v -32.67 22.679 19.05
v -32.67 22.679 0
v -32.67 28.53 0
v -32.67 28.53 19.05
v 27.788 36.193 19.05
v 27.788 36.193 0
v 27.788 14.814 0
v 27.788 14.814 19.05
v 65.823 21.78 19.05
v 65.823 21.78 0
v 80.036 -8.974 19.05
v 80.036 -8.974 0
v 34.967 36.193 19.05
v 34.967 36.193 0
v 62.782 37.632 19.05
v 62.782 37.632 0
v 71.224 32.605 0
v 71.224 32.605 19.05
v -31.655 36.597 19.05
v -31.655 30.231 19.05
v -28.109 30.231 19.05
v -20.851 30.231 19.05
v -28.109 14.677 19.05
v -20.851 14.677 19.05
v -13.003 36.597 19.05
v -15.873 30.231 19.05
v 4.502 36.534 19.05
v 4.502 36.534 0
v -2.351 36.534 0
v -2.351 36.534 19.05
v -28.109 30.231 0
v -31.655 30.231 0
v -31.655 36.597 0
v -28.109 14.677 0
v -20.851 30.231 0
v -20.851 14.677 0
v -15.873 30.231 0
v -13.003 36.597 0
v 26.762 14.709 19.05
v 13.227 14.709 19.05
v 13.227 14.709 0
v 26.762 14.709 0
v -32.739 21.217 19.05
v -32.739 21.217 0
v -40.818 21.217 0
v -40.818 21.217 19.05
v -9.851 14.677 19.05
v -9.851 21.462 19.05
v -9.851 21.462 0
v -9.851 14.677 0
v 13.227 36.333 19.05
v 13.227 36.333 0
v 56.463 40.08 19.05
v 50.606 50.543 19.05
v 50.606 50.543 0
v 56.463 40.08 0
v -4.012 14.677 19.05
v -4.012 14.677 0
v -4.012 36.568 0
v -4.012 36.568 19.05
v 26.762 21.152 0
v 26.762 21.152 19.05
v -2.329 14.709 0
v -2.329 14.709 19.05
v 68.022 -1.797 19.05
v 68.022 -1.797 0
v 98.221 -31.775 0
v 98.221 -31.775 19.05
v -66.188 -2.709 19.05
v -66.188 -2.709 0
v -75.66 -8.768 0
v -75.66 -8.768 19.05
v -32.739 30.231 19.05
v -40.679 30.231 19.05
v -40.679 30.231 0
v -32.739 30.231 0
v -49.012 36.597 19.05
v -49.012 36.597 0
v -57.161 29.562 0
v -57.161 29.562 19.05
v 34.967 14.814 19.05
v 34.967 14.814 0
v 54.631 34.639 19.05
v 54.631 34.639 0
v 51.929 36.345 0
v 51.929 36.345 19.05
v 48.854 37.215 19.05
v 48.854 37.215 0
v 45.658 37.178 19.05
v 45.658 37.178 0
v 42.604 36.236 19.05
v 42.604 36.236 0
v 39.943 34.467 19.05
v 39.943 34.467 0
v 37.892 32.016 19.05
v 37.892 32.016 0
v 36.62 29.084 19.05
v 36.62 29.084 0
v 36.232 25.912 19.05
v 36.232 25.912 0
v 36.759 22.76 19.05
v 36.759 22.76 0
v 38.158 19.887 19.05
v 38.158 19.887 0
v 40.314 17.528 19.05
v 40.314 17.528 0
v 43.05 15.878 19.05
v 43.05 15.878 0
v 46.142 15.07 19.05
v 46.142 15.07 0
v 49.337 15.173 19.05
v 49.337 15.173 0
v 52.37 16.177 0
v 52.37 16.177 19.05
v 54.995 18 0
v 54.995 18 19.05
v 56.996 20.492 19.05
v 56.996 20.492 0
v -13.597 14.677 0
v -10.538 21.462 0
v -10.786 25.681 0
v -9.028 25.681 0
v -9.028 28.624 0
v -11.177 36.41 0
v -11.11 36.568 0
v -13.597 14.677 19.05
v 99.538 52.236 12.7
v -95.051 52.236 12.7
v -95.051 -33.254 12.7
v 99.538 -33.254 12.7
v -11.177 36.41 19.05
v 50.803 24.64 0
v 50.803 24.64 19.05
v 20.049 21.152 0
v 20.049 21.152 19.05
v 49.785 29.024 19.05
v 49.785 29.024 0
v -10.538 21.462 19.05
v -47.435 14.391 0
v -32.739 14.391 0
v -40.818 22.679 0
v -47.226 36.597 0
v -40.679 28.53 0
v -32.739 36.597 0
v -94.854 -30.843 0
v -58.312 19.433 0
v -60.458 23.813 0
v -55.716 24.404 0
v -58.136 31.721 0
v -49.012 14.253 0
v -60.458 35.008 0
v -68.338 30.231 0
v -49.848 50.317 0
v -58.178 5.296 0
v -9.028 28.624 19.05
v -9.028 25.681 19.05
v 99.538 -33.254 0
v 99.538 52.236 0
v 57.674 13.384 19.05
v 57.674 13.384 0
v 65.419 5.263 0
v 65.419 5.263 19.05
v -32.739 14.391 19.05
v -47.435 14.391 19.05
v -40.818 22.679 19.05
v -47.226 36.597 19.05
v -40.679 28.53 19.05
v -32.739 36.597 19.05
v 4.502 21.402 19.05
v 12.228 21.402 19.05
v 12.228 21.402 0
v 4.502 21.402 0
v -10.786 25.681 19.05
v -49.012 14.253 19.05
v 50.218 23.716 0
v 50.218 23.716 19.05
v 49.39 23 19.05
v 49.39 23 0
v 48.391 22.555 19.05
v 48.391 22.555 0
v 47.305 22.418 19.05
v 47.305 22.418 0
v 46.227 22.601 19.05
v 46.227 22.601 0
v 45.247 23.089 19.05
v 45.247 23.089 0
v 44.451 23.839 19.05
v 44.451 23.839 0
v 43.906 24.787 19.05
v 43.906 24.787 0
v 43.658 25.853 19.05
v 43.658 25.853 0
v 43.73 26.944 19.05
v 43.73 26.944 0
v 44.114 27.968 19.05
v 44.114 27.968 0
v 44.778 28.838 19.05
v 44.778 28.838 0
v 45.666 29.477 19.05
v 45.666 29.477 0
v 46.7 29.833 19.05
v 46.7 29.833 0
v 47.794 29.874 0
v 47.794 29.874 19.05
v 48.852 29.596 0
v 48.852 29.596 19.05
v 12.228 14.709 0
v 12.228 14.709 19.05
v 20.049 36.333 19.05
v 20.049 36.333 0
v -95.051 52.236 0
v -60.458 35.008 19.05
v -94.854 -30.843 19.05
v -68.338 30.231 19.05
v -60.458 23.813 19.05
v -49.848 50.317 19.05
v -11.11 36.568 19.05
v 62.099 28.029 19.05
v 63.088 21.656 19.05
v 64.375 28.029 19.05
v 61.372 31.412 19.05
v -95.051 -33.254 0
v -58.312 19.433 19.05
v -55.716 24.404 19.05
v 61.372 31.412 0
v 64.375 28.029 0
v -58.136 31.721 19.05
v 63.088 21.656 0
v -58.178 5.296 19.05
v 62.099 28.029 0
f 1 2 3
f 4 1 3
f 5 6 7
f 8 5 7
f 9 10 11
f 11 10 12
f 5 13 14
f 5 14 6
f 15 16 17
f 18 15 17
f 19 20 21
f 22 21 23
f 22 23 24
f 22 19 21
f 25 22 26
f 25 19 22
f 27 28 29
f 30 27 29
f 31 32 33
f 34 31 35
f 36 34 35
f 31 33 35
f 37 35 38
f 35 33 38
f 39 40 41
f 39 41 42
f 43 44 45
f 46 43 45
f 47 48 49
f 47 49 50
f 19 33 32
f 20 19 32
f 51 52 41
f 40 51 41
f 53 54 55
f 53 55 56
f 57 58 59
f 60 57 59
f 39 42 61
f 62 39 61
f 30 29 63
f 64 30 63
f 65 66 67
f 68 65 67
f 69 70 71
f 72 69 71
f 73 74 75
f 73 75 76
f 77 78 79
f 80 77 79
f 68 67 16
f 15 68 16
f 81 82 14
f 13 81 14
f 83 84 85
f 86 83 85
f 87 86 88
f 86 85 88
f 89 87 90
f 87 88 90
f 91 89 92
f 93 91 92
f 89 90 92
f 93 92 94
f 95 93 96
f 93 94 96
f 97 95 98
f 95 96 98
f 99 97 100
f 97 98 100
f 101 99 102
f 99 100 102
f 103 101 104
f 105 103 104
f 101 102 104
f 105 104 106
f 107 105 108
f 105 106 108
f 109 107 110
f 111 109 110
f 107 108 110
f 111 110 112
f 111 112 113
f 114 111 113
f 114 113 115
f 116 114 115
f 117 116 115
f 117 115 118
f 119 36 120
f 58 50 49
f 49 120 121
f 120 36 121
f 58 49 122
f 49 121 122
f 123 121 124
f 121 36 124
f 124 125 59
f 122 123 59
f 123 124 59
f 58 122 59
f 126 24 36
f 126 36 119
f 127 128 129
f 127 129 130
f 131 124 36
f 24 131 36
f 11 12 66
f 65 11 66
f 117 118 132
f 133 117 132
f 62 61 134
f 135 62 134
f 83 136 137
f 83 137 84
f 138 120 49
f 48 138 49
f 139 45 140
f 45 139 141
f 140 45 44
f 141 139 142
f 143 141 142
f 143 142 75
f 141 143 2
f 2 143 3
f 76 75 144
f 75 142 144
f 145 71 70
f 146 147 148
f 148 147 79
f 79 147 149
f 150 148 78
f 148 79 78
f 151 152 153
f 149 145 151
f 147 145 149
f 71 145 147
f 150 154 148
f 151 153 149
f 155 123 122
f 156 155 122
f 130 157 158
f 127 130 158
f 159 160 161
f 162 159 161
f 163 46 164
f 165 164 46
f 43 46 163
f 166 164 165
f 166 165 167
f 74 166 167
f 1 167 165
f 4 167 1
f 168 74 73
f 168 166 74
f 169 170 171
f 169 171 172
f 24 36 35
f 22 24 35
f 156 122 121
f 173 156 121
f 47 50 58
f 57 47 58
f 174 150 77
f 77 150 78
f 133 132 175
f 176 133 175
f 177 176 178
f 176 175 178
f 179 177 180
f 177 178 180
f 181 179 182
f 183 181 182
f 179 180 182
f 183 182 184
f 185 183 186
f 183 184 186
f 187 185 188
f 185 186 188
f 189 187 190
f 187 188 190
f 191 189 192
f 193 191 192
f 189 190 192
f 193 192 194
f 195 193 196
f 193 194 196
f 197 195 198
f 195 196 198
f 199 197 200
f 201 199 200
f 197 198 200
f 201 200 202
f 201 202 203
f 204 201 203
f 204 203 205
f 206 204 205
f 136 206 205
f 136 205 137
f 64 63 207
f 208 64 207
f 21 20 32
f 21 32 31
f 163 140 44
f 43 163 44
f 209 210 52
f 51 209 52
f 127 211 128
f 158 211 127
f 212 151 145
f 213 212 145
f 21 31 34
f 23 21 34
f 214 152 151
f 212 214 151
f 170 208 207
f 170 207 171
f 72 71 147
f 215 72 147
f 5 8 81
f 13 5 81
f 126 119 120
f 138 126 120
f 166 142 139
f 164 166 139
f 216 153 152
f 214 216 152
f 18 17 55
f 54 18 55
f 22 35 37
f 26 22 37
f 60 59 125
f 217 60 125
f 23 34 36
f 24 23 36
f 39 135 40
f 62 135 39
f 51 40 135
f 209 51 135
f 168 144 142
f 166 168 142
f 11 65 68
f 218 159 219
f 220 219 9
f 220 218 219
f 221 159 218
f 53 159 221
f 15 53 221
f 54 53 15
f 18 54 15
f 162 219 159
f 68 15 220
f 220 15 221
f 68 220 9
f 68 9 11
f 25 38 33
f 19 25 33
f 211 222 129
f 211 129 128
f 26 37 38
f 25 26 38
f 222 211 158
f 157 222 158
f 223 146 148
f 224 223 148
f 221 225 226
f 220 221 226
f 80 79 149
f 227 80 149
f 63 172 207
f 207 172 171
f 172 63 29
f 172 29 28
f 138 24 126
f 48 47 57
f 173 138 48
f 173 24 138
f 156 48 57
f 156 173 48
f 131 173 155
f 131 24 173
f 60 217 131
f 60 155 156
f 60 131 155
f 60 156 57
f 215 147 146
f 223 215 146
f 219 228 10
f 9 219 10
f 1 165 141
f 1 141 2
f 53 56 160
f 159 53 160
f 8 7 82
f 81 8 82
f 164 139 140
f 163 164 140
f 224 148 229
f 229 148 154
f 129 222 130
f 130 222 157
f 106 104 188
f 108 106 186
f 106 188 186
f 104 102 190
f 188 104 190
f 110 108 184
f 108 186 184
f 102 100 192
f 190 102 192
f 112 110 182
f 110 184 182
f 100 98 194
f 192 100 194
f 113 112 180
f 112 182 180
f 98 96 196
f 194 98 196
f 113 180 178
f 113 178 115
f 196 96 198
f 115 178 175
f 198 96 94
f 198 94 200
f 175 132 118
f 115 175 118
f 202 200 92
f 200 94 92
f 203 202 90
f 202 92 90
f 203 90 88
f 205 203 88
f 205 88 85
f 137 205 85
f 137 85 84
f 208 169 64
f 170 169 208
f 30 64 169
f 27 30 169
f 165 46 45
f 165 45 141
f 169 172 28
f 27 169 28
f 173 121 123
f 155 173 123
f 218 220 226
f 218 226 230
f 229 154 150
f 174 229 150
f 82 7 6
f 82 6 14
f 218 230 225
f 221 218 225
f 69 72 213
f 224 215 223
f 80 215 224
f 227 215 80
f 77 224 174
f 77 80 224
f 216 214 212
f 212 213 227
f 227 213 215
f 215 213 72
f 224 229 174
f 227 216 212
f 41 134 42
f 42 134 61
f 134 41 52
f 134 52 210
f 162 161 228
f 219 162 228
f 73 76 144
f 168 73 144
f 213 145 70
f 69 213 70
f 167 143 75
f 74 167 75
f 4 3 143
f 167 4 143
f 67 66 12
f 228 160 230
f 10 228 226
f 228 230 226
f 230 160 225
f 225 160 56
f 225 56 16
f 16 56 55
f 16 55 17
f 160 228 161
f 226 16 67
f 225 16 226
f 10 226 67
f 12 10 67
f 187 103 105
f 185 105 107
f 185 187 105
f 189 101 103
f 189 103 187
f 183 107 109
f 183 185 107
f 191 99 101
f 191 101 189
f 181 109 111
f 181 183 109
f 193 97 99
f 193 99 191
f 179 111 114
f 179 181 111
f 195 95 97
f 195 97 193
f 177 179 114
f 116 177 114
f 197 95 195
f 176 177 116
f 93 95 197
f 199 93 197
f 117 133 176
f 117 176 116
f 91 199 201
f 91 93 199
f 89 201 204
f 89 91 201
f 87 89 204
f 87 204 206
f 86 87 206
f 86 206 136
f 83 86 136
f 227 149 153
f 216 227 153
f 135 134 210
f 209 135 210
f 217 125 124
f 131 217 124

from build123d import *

# Parameters (mm, degrees)
F2_DEPTH = 19.05
F1_W     = 194.589332
F1_H     = 85.490536
F3_DEPTH = 12.7


with BuildPart() as f2:
    # F0 (on Top) → F2 (new body)
    with BuildSketch(Plane.XY):
        Polygon((-60.458113, 35.008088), (-94.854079, -30.843109), (-66.187866, -2.708755), (-75.660013, -8.768145), (-60.458113, 23.813423), (-58.312221, 19.433456), (-55.715751, 24.404407), (-58.178183, 5.295916), (-49.012005, 14.252825), (-49.012005, 36.596801), (-57.160843, 29.562337), (-58.135916, 31.721428), (-49.847785, 50.317489), (-68.337902, 30.230967), align=None)
        Polygon((-32.73917, 36.596801), (-47.225986, 36.596801), (-47.434933, 14.391311), (-32.73917, 14.391311), (-32.73917, 21.21683), (-40.818356, 21.21683), (-40.818356, 22.679443), (-32.669522, 22.679443), (-32.669522, 28.529888), (-40.67906, 28.529888), (-40.67906, 30.230967), (-32.73917, 30.230967), align=None)
        Polygon((-11.176554, 36.409594), (-20.851059, 14.676579), (-13.596826, 14.676579), (-10.53778, 21.462255), (-9.850883, 21.462255), (-9.850883, 14.676579), (-4.011643, 14.676579), (-4.011643, 36.568381), (-11.110418, 36.568381), align=None)
        Polygon((-9.0278, 25.681175), (-10.786415, 25.681175), (-9.0278, 28.62381), align=None, mode=Mode.SUBTRACT)
        Polygon((-13.003096, 36.596801), (-31.655155, 36.596801), (-31.655155, 30.230967), (-28.109251, 30.230967), (-28.109251, 14.676579), (-20.851059, 14.676579), (-20.851059, 30.230967), (-15.872873, 30.230967), align=None)
        Polygon((4.501756, 36.533799), (-2.350571, 36.533799), (-2.328525, 14.708572), (12.227939, 14.708572), (12.227939, 21.401916), (4.501756, 21.401916), align=None)
        Polygon((20.04927, 36.332581), (13.22668, 36.332581), (13.22668, 14.708572), (26.762206, 14.708572), (26.762206, 21.151813), (20.04927, 21.151813), align=None)
        Polygon((34.966625, 36.193457), (27.917653, 36.193457), (27.78833, 36.193457), (27.78833, 14.813854), (34.966625, 14.813854), align=None)
        with BuildLine():
            Line((49.784653, 29.024474), (54.630718, 34.638999))
            ThreePointArc((54.630718, 34.638999), (36.382, 24.317334), (56.995582, 20.492061))
            Line((56.995582, 20.492061), (50.803033, 24.640113))
            ThreePointArc((50.803033, 24.640113), (43.742684, 25.310619), (49.784653, 29.024474))
        make_face()
        Polygon((71.224019, 32.604653), (50.605912, 50.543044), (56.463264, 40.08029), (57.673536, 13.384022), (65.418862, 5.262706), (63.087747, 21.655733), (65.823419, 21.779754), (80.036186, -8.974304), (68.021879, -1.797337), (98.221131, -31.775285), (62.782384, 37.631691), align=None)
        Polygon((64.375177, 28.02885), (62.098779, 28.02885), (61.371598, 31.411827), align=None, mode=Mode.SUBTRACT)
    extrude(amount=F2_DEPTH)


with BuildPart() as f3:
    # F1 (on Top) → F3 (new body)
    with BuildSketch(Plane.XY):
        with Locations((2.243698, 9.491088)):
            Rectangle(F1_W, F1_H)
    extrude(amount=F3_DEPTH)


solid = Compound([f2.part, f3.part])
